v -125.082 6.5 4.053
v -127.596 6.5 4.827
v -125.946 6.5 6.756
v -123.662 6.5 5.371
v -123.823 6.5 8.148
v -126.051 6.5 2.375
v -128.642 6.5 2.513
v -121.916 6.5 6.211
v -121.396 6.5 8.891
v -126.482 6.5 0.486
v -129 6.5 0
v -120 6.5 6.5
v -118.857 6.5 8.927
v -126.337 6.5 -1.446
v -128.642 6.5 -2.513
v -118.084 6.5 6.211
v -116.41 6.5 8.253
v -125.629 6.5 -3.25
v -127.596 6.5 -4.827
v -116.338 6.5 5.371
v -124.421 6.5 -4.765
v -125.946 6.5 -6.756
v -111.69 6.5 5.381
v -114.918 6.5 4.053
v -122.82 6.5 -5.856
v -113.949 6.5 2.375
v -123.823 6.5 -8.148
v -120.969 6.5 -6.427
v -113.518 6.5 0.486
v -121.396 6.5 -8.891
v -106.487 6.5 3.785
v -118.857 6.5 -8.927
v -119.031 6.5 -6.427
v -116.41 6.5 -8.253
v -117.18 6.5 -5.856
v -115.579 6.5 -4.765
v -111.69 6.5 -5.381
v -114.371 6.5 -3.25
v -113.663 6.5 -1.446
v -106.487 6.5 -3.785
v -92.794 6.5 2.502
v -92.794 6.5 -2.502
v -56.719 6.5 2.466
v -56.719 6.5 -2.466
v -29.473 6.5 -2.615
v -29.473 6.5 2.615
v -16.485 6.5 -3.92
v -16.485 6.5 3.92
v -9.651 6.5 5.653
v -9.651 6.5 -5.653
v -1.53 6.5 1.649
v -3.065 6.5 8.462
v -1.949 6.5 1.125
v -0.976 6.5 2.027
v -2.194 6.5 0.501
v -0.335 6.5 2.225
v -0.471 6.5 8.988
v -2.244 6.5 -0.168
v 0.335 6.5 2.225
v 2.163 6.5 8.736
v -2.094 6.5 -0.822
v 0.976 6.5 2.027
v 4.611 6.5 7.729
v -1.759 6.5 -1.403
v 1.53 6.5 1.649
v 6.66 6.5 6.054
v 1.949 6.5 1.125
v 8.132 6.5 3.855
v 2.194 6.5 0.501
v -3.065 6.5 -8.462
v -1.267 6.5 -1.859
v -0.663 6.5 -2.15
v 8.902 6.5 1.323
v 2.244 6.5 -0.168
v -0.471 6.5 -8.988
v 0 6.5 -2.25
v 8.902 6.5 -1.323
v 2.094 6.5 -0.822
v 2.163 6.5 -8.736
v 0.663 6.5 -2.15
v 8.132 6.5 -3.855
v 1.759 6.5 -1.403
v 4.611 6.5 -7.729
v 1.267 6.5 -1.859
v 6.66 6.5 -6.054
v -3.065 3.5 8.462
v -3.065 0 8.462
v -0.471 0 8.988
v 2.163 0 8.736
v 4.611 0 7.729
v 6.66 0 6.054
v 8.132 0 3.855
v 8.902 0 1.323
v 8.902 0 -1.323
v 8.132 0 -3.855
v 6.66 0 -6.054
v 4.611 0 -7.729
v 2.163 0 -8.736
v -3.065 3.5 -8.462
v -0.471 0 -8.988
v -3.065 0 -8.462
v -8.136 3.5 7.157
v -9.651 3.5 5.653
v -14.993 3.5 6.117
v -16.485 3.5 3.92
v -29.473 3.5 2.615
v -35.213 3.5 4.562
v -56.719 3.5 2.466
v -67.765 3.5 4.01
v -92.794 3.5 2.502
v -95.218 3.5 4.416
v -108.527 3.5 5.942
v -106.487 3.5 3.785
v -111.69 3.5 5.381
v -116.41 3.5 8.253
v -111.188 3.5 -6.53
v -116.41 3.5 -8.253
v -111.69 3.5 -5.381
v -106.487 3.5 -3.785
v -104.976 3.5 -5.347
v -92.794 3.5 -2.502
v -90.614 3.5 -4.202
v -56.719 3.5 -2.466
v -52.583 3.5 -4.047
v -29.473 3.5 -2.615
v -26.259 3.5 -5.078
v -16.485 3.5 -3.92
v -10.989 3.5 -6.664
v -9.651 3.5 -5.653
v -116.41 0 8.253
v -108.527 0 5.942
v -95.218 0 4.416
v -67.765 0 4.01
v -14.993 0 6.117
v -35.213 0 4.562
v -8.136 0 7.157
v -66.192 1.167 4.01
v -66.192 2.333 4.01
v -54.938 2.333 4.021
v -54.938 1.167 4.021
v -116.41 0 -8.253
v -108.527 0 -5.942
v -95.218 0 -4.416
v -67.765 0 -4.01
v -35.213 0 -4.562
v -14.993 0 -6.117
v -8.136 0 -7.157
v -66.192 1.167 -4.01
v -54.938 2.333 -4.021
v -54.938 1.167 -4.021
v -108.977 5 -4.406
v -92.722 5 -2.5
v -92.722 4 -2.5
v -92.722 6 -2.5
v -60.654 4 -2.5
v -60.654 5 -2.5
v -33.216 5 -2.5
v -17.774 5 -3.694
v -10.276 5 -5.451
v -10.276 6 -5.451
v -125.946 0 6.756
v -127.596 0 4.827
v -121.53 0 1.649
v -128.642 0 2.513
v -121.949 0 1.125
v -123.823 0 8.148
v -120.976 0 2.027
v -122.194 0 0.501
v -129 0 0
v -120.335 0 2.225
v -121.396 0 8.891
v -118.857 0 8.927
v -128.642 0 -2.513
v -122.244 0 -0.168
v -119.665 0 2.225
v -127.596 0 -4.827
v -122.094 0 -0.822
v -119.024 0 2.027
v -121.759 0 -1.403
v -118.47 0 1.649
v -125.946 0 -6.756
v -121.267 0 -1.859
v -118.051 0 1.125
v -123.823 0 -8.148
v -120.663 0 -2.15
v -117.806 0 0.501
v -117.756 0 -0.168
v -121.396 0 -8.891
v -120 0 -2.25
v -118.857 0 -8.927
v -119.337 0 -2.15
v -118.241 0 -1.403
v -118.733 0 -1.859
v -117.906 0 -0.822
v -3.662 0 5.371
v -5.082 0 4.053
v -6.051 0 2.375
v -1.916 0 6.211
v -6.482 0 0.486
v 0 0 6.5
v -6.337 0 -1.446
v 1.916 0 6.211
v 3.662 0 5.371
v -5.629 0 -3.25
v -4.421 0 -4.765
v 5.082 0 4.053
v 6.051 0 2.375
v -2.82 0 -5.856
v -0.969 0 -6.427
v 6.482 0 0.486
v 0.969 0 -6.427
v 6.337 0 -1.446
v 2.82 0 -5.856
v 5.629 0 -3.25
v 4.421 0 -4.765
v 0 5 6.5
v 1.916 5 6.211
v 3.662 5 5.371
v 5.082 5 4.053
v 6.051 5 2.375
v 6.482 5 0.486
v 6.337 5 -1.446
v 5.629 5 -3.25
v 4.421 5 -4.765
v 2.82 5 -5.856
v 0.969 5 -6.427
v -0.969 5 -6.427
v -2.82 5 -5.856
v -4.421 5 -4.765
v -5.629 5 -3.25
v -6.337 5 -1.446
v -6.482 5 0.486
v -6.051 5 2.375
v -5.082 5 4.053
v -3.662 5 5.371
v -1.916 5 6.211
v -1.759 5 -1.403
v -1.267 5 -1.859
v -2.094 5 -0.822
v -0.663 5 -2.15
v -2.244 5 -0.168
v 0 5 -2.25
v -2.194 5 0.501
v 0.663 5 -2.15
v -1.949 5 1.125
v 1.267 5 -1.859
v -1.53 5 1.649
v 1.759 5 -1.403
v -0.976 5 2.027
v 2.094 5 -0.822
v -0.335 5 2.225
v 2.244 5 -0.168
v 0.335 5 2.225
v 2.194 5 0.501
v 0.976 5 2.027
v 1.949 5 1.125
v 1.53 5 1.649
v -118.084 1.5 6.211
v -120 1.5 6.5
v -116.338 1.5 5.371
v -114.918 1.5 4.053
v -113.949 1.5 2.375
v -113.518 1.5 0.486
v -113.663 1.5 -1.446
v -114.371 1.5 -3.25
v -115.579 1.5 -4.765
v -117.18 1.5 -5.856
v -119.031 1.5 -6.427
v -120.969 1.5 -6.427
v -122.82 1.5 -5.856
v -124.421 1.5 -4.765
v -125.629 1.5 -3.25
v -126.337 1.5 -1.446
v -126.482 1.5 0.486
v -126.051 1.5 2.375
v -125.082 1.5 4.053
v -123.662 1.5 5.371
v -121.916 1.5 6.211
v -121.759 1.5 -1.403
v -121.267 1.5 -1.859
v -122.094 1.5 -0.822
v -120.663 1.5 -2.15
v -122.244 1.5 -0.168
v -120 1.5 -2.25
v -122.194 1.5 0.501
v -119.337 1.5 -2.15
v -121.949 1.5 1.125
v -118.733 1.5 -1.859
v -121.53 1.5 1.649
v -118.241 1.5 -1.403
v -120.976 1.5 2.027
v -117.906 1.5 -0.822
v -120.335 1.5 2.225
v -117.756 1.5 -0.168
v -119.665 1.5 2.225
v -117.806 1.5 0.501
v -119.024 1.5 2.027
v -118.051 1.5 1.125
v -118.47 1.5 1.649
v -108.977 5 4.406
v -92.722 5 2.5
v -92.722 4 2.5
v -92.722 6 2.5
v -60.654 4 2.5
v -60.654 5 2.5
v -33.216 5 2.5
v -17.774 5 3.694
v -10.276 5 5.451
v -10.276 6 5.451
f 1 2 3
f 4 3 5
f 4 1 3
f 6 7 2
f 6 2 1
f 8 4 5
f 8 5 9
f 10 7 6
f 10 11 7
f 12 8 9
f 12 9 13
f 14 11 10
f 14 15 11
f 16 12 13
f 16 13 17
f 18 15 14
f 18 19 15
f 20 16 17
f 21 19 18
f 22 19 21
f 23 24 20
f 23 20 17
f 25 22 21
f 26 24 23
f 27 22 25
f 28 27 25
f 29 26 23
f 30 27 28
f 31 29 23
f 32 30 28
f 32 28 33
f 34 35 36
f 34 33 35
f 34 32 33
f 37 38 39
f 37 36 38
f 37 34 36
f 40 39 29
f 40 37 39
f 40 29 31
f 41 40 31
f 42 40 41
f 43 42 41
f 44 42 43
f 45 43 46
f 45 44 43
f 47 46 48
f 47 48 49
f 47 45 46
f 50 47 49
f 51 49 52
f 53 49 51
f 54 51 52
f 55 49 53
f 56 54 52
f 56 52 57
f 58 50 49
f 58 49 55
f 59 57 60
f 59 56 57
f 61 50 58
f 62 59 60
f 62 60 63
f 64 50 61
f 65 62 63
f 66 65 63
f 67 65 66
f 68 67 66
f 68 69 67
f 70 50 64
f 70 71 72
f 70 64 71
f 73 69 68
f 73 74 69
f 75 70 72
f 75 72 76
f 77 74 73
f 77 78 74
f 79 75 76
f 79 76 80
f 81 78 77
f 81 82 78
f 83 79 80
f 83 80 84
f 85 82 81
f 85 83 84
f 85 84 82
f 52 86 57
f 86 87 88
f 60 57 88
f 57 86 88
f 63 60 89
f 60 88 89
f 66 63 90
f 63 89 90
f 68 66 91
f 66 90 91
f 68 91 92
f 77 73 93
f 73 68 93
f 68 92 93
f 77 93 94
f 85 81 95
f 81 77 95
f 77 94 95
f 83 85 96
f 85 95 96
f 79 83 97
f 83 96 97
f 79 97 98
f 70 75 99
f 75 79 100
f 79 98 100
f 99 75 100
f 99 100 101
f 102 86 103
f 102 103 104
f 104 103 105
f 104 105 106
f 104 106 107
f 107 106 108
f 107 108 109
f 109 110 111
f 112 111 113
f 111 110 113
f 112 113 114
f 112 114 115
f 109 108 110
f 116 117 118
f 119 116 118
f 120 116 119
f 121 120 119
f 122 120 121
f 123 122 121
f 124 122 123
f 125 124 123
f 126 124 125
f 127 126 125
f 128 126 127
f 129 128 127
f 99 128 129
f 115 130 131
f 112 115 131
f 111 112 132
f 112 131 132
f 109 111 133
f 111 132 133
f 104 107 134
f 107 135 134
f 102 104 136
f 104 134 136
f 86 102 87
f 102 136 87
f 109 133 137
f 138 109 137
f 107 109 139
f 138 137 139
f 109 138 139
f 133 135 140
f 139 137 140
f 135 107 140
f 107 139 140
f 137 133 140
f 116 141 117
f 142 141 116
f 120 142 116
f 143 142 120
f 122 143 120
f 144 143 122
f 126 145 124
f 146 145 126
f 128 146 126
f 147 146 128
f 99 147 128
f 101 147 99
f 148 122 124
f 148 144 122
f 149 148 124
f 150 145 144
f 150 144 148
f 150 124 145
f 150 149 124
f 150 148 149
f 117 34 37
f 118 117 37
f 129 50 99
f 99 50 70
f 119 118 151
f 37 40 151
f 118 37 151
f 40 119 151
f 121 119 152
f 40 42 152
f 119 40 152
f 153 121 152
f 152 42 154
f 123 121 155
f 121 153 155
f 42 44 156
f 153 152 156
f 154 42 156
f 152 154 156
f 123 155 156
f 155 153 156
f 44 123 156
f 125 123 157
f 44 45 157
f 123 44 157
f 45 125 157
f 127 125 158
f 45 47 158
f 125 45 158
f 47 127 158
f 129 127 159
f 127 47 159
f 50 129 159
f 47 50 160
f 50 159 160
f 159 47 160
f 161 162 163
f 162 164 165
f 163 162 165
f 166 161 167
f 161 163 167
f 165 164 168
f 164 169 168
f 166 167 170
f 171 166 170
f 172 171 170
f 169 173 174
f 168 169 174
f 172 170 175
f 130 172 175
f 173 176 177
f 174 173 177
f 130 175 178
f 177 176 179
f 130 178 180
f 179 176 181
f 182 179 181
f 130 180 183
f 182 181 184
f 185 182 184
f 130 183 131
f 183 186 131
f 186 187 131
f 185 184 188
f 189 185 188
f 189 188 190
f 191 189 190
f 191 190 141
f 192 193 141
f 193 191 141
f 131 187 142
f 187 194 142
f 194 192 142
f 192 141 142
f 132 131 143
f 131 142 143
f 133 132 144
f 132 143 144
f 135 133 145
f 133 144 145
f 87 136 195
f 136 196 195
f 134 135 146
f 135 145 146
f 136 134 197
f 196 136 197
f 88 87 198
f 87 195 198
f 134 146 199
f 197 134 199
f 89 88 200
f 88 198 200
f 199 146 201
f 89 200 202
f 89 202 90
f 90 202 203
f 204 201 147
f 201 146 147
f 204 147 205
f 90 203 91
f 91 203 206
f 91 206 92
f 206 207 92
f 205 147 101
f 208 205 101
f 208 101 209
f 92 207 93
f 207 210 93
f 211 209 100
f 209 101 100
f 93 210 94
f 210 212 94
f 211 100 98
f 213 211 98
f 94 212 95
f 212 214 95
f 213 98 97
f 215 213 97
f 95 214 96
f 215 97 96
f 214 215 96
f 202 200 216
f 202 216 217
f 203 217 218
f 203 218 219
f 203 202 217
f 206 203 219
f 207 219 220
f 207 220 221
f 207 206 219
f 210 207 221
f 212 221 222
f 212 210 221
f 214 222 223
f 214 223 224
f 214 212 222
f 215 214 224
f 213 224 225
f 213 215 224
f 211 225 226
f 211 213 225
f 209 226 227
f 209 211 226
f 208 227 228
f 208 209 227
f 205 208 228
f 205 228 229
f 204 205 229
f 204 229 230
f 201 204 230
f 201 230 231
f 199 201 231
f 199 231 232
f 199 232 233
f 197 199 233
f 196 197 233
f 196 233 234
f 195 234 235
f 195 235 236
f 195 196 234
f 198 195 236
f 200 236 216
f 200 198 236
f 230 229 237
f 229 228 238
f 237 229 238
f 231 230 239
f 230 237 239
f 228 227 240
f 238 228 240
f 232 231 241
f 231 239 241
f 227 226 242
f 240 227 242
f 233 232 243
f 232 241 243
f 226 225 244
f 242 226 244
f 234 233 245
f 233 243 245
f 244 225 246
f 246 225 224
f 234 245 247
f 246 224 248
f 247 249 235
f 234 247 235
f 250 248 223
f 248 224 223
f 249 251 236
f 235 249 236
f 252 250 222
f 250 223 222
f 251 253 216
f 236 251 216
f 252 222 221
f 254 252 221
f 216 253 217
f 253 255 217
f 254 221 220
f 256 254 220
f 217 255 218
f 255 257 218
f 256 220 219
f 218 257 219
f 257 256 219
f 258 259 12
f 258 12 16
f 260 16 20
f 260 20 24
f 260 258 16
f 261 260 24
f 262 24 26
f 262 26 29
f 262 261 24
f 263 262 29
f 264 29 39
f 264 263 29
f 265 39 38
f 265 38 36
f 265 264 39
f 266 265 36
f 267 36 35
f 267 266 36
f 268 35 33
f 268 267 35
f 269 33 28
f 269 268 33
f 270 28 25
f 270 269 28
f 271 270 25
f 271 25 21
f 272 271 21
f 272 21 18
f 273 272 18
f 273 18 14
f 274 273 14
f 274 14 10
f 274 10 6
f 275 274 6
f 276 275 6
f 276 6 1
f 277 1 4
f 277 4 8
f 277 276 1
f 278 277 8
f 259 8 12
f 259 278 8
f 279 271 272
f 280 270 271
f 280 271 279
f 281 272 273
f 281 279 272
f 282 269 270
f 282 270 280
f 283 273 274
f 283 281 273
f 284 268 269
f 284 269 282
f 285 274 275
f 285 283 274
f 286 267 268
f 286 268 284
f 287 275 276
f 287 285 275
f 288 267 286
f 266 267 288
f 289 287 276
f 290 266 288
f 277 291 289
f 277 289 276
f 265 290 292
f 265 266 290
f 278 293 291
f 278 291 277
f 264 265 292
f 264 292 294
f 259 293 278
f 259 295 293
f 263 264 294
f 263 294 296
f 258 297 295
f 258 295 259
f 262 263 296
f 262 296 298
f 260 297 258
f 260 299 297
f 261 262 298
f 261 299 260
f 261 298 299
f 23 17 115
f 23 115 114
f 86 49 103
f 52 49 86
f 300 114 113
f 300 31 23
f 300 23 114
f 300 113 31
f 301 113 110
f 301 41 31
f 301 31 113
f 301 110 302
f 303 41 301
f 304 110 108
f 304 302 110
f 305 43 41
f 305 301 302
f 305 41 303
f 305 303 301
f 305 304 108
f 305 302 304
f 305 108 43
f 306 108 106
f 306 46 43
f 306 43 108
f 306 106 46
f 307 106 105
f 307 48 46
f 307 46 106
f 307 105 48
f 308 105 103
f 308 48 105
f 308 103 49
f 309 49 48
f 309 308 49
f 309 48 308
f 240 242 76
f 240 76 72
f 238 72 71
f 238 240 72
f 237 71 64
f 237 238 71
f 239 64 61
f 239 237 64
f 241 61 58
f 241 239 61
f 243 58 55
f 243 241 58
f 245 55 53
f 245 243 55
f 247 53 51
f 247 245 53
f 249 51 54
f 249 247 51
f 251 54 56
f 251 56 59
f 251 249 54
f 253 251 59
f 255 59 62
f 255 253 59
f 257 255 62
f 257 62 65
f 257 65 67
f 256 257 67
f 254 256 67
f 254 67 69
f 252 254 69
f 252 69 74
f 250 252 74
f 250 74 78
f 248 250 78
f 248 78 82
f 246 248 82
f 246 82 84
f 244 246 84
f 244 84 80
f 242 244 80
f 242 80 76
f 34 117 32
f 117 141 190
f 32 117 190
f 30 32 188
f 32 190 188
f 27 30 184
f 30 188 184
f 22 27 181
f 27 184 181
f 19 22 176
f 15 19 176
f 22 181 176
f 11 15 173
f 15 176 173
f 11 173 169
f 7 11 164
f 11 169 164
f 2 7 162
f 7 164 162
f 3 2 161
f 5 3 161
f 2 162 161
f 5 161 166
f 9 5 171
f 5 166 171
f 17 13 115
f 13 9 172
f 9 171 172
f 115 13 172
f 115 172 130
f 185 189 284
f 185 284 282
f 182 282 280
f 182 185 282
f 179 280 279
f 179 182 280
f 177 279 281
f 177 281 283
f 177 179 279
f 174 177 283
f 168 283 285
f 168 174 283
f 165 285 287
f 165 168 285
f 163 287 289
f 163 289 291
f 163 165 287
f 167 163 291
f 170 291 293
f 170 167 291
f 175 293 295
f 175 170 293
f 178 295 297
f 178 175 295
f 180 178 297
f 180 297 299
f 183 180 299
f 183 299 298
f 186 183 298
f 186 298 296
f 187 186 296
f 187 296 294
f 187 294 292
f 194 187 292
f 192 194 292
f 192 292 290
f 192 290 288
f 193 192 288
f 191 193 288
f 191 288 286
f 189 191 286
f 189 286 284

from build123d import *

# Parameters (mm, degrees)
SKETCH1_R           = 9
SKETCH1_R_2         = 2.25
BOSS_EXTRUDE1_DEPTH = 6.5
CUT_EXTRUDE1_START  = -5
SKETCH2_R           = 6.5
SKETCH2_R_2         = 2.25
CUT_EXTRUDE1_DEPTH  = 5
CUT_EXTRUDE2_DEPTH  = 3
CUT_EXTRUDE3_START  = -6.5
SKETCH2_3_R         = 6.5
CUT_EXTRUDE3_DEPTH  = 5


with BuildPart() as part:
    # Sketch1 → Boss-Extrude1 (new body)
    # profile 1 of 3: a face of its own
    with BuildSketch(Plane(origin=(0, 0, 0), x_dir=(1, 0, 0), z_dir=(0, 1, 0))):
        with Locations((-120, 0)):
            Circle(SKETCH1_R)
        with Locations(Location((-120, 0, 0), (0, 0, 90))):
            Circle(SKETCH1_R_2, mode=Mode.SUBTRACT)
    # profile 2 of 3: a face of its own
    with BuildSketch(Plane(origin=(0, 0, 0), x_dir=(1, 0, 0), z_dir=(0, 1, 0))):
        with BuildLine():
            ThreePointArc((-116.409605108, 8.252821609), (-112.472930383, 4.933885182), (-111, 0))
            ThreePointArc((-111, 0), (-112.472930383, -4.933885182), (-116.409605108, -8.252821609))
            add(Edge.make_bspline(
                [(-116.409605108, -8.252821609), (-105.478903695, -3.497413535), (-80.532354503, -4.12846793), (-45.700894509, -3.892627812), (-12.04915124, -5.208001503), (-3.064915464, -8.462050177)],
                knots=[0, 0, 0, 0, 0.514412912, 0.614412912, 1, 1, 1, 1], degree=3))
            ThreePointArc((-3.064915464, -8.462050177), (-9, 0), (-3.064915464, 8.462050177))
            add(Edge.make_bspline(
                [(-116.409605108, 8.252821609), (-105.478903695, 3.497413535), (-80.532354503, 4.12846793), (-45.700894509, 3.892627812), (-12.04915124, 5.208001503), (-3.064915464, 8.462050177)],
                knots=[0, 0, 0, 0, 0.514412912, 0.614412912, 1, 1, 1, 1], degree=3))
        make_face()
    # profile 3 of 3: a face of its own
    with BuildSketch(Plane(origin=(0, 0, 0), x_dir=(1, 0, 0), z_dir=(0, 1, 0))):
        Circle(SKETCH1_R)
        with Locations(Location((0, 0, 0), (0, 0, 90))):
            Circle(SKETCH1_R_2, mode=Mode.SUBTRACT)
    extrude(amount=BOSS_EXTRUDE1_DEPTH)

    # Sketch2 → Cut-Extrude1 (cut)
    with BuildSketch(Plane(origin=(0, 6.5, 0), x_dir=(1, 0, 0), z_dir=(0, 1, 0)).offset(CUT_EXTRUDE1_START)):
        with Locations(Location((-120, 0, 0), (0, 0, 270))):
            Circle(SKETCH2_R)
        with Locations(Location((-120, 0, 0), (0, 0, 90))):
            Circle(SKETCH2_R_2, mode=Mode.SUBTRACT)
    extrude(amount=CUT_EXTRUDE1_DEPTH, mode=Mode.SUBTRACT)

    # Sketch3 → Cut-Extrude2 (cut)
    with BuildSketch(Plane(origin=(0, 6.5, 0), x_dir=(1, 0, 0), z_dir=(0, 1, 0))):
        with BuildLine():
            add(Edge.make_bspline(
                [(-116.409605108, -8.252821609), (-111.926525136, -4.515073542), (-103.615159098, -3.007845736), (-91.22070001, -2.347255299), (-77.849021373, -2.568456126), (-58.009603755, -2.53414615), (-32.098488239, -2.117697646), (-12.442081893, -3.452077228), (-3.064915464, -8.462050177)],
                knots=[0, 0, 0, 0, 0.145433364, 0.214931865, 0.323765467, 0.493222335, 0.731337307, 1, 1, 1, 1], degree=3))
            add(Edge.make_bspline(
                [(-116.409605108, -8.252821609), (-105.478903695, -3.497413535), (-80.532354503, -4.12846793), (-45.700894509, -3.892627812), (-12.04915124, -5.208001503), (-3.064915464, -8.462050177)],
                knots=[0, 0, 0, 0, 0.514412912, 0.614412912, 1, 1, 1, 1], degree=3))
        make_face()
        with BuildLine():
            add(Edge.make_bspline(
                [(-116.409605108, 8.252821609), (-111.926525136, 4.515073542), (-103.615159098, 3.007845736), (-91.22070001, 2.347255299), (-77.849021373, 2.568456126), (-58.009603755, 2.53414615), (-32.098488239, 2.117697646), (-12.442081893, 3.452077228), (-3.064915464, 8.462050177)],
                knots=[0, 0, 0, 0, 0.145433364, 0.214931865, 0.323765467, 0.493222335, 0.731337307, 1, 1, 1, 1], degree=3))
            add(Edge.make_bspline(
                [(-3.064915464, 8.462050177), (-12.04915124, 5.208001503), (-45.700894509, 3.892627812), (-80.532354503, 4.12846793), (-105.478903695, 3.497413535), (-116.409605108, 8.252821609)],
                knots=[0, 0, 0, 0, 0.385587088, 0.485587088, 1, 1, 1, 1], degree=3))
        make_face()
    extrude(amount=-CUT_EXTRUDE2_DEPTH, mode=Mode.SUBTRACT)

    # Sketch2<3> → Cut-Extrude3 (cut)
    with BuildSketch(Plane(origin=(0, 6.5, 0), x_dir=(1, 0, 0), z_dir=(0, 1, 0)).offset(CUT_EXTRUDE3_START)):
        with Locations(Location((0, 0, 0), (0, 0, 270))):
            Circle(SKETCH2_3_R)
    extrude(amount=CUT_EXTRUDE3_DEPTH, mode=Mode.SUBTRACT)


solid = part.part
